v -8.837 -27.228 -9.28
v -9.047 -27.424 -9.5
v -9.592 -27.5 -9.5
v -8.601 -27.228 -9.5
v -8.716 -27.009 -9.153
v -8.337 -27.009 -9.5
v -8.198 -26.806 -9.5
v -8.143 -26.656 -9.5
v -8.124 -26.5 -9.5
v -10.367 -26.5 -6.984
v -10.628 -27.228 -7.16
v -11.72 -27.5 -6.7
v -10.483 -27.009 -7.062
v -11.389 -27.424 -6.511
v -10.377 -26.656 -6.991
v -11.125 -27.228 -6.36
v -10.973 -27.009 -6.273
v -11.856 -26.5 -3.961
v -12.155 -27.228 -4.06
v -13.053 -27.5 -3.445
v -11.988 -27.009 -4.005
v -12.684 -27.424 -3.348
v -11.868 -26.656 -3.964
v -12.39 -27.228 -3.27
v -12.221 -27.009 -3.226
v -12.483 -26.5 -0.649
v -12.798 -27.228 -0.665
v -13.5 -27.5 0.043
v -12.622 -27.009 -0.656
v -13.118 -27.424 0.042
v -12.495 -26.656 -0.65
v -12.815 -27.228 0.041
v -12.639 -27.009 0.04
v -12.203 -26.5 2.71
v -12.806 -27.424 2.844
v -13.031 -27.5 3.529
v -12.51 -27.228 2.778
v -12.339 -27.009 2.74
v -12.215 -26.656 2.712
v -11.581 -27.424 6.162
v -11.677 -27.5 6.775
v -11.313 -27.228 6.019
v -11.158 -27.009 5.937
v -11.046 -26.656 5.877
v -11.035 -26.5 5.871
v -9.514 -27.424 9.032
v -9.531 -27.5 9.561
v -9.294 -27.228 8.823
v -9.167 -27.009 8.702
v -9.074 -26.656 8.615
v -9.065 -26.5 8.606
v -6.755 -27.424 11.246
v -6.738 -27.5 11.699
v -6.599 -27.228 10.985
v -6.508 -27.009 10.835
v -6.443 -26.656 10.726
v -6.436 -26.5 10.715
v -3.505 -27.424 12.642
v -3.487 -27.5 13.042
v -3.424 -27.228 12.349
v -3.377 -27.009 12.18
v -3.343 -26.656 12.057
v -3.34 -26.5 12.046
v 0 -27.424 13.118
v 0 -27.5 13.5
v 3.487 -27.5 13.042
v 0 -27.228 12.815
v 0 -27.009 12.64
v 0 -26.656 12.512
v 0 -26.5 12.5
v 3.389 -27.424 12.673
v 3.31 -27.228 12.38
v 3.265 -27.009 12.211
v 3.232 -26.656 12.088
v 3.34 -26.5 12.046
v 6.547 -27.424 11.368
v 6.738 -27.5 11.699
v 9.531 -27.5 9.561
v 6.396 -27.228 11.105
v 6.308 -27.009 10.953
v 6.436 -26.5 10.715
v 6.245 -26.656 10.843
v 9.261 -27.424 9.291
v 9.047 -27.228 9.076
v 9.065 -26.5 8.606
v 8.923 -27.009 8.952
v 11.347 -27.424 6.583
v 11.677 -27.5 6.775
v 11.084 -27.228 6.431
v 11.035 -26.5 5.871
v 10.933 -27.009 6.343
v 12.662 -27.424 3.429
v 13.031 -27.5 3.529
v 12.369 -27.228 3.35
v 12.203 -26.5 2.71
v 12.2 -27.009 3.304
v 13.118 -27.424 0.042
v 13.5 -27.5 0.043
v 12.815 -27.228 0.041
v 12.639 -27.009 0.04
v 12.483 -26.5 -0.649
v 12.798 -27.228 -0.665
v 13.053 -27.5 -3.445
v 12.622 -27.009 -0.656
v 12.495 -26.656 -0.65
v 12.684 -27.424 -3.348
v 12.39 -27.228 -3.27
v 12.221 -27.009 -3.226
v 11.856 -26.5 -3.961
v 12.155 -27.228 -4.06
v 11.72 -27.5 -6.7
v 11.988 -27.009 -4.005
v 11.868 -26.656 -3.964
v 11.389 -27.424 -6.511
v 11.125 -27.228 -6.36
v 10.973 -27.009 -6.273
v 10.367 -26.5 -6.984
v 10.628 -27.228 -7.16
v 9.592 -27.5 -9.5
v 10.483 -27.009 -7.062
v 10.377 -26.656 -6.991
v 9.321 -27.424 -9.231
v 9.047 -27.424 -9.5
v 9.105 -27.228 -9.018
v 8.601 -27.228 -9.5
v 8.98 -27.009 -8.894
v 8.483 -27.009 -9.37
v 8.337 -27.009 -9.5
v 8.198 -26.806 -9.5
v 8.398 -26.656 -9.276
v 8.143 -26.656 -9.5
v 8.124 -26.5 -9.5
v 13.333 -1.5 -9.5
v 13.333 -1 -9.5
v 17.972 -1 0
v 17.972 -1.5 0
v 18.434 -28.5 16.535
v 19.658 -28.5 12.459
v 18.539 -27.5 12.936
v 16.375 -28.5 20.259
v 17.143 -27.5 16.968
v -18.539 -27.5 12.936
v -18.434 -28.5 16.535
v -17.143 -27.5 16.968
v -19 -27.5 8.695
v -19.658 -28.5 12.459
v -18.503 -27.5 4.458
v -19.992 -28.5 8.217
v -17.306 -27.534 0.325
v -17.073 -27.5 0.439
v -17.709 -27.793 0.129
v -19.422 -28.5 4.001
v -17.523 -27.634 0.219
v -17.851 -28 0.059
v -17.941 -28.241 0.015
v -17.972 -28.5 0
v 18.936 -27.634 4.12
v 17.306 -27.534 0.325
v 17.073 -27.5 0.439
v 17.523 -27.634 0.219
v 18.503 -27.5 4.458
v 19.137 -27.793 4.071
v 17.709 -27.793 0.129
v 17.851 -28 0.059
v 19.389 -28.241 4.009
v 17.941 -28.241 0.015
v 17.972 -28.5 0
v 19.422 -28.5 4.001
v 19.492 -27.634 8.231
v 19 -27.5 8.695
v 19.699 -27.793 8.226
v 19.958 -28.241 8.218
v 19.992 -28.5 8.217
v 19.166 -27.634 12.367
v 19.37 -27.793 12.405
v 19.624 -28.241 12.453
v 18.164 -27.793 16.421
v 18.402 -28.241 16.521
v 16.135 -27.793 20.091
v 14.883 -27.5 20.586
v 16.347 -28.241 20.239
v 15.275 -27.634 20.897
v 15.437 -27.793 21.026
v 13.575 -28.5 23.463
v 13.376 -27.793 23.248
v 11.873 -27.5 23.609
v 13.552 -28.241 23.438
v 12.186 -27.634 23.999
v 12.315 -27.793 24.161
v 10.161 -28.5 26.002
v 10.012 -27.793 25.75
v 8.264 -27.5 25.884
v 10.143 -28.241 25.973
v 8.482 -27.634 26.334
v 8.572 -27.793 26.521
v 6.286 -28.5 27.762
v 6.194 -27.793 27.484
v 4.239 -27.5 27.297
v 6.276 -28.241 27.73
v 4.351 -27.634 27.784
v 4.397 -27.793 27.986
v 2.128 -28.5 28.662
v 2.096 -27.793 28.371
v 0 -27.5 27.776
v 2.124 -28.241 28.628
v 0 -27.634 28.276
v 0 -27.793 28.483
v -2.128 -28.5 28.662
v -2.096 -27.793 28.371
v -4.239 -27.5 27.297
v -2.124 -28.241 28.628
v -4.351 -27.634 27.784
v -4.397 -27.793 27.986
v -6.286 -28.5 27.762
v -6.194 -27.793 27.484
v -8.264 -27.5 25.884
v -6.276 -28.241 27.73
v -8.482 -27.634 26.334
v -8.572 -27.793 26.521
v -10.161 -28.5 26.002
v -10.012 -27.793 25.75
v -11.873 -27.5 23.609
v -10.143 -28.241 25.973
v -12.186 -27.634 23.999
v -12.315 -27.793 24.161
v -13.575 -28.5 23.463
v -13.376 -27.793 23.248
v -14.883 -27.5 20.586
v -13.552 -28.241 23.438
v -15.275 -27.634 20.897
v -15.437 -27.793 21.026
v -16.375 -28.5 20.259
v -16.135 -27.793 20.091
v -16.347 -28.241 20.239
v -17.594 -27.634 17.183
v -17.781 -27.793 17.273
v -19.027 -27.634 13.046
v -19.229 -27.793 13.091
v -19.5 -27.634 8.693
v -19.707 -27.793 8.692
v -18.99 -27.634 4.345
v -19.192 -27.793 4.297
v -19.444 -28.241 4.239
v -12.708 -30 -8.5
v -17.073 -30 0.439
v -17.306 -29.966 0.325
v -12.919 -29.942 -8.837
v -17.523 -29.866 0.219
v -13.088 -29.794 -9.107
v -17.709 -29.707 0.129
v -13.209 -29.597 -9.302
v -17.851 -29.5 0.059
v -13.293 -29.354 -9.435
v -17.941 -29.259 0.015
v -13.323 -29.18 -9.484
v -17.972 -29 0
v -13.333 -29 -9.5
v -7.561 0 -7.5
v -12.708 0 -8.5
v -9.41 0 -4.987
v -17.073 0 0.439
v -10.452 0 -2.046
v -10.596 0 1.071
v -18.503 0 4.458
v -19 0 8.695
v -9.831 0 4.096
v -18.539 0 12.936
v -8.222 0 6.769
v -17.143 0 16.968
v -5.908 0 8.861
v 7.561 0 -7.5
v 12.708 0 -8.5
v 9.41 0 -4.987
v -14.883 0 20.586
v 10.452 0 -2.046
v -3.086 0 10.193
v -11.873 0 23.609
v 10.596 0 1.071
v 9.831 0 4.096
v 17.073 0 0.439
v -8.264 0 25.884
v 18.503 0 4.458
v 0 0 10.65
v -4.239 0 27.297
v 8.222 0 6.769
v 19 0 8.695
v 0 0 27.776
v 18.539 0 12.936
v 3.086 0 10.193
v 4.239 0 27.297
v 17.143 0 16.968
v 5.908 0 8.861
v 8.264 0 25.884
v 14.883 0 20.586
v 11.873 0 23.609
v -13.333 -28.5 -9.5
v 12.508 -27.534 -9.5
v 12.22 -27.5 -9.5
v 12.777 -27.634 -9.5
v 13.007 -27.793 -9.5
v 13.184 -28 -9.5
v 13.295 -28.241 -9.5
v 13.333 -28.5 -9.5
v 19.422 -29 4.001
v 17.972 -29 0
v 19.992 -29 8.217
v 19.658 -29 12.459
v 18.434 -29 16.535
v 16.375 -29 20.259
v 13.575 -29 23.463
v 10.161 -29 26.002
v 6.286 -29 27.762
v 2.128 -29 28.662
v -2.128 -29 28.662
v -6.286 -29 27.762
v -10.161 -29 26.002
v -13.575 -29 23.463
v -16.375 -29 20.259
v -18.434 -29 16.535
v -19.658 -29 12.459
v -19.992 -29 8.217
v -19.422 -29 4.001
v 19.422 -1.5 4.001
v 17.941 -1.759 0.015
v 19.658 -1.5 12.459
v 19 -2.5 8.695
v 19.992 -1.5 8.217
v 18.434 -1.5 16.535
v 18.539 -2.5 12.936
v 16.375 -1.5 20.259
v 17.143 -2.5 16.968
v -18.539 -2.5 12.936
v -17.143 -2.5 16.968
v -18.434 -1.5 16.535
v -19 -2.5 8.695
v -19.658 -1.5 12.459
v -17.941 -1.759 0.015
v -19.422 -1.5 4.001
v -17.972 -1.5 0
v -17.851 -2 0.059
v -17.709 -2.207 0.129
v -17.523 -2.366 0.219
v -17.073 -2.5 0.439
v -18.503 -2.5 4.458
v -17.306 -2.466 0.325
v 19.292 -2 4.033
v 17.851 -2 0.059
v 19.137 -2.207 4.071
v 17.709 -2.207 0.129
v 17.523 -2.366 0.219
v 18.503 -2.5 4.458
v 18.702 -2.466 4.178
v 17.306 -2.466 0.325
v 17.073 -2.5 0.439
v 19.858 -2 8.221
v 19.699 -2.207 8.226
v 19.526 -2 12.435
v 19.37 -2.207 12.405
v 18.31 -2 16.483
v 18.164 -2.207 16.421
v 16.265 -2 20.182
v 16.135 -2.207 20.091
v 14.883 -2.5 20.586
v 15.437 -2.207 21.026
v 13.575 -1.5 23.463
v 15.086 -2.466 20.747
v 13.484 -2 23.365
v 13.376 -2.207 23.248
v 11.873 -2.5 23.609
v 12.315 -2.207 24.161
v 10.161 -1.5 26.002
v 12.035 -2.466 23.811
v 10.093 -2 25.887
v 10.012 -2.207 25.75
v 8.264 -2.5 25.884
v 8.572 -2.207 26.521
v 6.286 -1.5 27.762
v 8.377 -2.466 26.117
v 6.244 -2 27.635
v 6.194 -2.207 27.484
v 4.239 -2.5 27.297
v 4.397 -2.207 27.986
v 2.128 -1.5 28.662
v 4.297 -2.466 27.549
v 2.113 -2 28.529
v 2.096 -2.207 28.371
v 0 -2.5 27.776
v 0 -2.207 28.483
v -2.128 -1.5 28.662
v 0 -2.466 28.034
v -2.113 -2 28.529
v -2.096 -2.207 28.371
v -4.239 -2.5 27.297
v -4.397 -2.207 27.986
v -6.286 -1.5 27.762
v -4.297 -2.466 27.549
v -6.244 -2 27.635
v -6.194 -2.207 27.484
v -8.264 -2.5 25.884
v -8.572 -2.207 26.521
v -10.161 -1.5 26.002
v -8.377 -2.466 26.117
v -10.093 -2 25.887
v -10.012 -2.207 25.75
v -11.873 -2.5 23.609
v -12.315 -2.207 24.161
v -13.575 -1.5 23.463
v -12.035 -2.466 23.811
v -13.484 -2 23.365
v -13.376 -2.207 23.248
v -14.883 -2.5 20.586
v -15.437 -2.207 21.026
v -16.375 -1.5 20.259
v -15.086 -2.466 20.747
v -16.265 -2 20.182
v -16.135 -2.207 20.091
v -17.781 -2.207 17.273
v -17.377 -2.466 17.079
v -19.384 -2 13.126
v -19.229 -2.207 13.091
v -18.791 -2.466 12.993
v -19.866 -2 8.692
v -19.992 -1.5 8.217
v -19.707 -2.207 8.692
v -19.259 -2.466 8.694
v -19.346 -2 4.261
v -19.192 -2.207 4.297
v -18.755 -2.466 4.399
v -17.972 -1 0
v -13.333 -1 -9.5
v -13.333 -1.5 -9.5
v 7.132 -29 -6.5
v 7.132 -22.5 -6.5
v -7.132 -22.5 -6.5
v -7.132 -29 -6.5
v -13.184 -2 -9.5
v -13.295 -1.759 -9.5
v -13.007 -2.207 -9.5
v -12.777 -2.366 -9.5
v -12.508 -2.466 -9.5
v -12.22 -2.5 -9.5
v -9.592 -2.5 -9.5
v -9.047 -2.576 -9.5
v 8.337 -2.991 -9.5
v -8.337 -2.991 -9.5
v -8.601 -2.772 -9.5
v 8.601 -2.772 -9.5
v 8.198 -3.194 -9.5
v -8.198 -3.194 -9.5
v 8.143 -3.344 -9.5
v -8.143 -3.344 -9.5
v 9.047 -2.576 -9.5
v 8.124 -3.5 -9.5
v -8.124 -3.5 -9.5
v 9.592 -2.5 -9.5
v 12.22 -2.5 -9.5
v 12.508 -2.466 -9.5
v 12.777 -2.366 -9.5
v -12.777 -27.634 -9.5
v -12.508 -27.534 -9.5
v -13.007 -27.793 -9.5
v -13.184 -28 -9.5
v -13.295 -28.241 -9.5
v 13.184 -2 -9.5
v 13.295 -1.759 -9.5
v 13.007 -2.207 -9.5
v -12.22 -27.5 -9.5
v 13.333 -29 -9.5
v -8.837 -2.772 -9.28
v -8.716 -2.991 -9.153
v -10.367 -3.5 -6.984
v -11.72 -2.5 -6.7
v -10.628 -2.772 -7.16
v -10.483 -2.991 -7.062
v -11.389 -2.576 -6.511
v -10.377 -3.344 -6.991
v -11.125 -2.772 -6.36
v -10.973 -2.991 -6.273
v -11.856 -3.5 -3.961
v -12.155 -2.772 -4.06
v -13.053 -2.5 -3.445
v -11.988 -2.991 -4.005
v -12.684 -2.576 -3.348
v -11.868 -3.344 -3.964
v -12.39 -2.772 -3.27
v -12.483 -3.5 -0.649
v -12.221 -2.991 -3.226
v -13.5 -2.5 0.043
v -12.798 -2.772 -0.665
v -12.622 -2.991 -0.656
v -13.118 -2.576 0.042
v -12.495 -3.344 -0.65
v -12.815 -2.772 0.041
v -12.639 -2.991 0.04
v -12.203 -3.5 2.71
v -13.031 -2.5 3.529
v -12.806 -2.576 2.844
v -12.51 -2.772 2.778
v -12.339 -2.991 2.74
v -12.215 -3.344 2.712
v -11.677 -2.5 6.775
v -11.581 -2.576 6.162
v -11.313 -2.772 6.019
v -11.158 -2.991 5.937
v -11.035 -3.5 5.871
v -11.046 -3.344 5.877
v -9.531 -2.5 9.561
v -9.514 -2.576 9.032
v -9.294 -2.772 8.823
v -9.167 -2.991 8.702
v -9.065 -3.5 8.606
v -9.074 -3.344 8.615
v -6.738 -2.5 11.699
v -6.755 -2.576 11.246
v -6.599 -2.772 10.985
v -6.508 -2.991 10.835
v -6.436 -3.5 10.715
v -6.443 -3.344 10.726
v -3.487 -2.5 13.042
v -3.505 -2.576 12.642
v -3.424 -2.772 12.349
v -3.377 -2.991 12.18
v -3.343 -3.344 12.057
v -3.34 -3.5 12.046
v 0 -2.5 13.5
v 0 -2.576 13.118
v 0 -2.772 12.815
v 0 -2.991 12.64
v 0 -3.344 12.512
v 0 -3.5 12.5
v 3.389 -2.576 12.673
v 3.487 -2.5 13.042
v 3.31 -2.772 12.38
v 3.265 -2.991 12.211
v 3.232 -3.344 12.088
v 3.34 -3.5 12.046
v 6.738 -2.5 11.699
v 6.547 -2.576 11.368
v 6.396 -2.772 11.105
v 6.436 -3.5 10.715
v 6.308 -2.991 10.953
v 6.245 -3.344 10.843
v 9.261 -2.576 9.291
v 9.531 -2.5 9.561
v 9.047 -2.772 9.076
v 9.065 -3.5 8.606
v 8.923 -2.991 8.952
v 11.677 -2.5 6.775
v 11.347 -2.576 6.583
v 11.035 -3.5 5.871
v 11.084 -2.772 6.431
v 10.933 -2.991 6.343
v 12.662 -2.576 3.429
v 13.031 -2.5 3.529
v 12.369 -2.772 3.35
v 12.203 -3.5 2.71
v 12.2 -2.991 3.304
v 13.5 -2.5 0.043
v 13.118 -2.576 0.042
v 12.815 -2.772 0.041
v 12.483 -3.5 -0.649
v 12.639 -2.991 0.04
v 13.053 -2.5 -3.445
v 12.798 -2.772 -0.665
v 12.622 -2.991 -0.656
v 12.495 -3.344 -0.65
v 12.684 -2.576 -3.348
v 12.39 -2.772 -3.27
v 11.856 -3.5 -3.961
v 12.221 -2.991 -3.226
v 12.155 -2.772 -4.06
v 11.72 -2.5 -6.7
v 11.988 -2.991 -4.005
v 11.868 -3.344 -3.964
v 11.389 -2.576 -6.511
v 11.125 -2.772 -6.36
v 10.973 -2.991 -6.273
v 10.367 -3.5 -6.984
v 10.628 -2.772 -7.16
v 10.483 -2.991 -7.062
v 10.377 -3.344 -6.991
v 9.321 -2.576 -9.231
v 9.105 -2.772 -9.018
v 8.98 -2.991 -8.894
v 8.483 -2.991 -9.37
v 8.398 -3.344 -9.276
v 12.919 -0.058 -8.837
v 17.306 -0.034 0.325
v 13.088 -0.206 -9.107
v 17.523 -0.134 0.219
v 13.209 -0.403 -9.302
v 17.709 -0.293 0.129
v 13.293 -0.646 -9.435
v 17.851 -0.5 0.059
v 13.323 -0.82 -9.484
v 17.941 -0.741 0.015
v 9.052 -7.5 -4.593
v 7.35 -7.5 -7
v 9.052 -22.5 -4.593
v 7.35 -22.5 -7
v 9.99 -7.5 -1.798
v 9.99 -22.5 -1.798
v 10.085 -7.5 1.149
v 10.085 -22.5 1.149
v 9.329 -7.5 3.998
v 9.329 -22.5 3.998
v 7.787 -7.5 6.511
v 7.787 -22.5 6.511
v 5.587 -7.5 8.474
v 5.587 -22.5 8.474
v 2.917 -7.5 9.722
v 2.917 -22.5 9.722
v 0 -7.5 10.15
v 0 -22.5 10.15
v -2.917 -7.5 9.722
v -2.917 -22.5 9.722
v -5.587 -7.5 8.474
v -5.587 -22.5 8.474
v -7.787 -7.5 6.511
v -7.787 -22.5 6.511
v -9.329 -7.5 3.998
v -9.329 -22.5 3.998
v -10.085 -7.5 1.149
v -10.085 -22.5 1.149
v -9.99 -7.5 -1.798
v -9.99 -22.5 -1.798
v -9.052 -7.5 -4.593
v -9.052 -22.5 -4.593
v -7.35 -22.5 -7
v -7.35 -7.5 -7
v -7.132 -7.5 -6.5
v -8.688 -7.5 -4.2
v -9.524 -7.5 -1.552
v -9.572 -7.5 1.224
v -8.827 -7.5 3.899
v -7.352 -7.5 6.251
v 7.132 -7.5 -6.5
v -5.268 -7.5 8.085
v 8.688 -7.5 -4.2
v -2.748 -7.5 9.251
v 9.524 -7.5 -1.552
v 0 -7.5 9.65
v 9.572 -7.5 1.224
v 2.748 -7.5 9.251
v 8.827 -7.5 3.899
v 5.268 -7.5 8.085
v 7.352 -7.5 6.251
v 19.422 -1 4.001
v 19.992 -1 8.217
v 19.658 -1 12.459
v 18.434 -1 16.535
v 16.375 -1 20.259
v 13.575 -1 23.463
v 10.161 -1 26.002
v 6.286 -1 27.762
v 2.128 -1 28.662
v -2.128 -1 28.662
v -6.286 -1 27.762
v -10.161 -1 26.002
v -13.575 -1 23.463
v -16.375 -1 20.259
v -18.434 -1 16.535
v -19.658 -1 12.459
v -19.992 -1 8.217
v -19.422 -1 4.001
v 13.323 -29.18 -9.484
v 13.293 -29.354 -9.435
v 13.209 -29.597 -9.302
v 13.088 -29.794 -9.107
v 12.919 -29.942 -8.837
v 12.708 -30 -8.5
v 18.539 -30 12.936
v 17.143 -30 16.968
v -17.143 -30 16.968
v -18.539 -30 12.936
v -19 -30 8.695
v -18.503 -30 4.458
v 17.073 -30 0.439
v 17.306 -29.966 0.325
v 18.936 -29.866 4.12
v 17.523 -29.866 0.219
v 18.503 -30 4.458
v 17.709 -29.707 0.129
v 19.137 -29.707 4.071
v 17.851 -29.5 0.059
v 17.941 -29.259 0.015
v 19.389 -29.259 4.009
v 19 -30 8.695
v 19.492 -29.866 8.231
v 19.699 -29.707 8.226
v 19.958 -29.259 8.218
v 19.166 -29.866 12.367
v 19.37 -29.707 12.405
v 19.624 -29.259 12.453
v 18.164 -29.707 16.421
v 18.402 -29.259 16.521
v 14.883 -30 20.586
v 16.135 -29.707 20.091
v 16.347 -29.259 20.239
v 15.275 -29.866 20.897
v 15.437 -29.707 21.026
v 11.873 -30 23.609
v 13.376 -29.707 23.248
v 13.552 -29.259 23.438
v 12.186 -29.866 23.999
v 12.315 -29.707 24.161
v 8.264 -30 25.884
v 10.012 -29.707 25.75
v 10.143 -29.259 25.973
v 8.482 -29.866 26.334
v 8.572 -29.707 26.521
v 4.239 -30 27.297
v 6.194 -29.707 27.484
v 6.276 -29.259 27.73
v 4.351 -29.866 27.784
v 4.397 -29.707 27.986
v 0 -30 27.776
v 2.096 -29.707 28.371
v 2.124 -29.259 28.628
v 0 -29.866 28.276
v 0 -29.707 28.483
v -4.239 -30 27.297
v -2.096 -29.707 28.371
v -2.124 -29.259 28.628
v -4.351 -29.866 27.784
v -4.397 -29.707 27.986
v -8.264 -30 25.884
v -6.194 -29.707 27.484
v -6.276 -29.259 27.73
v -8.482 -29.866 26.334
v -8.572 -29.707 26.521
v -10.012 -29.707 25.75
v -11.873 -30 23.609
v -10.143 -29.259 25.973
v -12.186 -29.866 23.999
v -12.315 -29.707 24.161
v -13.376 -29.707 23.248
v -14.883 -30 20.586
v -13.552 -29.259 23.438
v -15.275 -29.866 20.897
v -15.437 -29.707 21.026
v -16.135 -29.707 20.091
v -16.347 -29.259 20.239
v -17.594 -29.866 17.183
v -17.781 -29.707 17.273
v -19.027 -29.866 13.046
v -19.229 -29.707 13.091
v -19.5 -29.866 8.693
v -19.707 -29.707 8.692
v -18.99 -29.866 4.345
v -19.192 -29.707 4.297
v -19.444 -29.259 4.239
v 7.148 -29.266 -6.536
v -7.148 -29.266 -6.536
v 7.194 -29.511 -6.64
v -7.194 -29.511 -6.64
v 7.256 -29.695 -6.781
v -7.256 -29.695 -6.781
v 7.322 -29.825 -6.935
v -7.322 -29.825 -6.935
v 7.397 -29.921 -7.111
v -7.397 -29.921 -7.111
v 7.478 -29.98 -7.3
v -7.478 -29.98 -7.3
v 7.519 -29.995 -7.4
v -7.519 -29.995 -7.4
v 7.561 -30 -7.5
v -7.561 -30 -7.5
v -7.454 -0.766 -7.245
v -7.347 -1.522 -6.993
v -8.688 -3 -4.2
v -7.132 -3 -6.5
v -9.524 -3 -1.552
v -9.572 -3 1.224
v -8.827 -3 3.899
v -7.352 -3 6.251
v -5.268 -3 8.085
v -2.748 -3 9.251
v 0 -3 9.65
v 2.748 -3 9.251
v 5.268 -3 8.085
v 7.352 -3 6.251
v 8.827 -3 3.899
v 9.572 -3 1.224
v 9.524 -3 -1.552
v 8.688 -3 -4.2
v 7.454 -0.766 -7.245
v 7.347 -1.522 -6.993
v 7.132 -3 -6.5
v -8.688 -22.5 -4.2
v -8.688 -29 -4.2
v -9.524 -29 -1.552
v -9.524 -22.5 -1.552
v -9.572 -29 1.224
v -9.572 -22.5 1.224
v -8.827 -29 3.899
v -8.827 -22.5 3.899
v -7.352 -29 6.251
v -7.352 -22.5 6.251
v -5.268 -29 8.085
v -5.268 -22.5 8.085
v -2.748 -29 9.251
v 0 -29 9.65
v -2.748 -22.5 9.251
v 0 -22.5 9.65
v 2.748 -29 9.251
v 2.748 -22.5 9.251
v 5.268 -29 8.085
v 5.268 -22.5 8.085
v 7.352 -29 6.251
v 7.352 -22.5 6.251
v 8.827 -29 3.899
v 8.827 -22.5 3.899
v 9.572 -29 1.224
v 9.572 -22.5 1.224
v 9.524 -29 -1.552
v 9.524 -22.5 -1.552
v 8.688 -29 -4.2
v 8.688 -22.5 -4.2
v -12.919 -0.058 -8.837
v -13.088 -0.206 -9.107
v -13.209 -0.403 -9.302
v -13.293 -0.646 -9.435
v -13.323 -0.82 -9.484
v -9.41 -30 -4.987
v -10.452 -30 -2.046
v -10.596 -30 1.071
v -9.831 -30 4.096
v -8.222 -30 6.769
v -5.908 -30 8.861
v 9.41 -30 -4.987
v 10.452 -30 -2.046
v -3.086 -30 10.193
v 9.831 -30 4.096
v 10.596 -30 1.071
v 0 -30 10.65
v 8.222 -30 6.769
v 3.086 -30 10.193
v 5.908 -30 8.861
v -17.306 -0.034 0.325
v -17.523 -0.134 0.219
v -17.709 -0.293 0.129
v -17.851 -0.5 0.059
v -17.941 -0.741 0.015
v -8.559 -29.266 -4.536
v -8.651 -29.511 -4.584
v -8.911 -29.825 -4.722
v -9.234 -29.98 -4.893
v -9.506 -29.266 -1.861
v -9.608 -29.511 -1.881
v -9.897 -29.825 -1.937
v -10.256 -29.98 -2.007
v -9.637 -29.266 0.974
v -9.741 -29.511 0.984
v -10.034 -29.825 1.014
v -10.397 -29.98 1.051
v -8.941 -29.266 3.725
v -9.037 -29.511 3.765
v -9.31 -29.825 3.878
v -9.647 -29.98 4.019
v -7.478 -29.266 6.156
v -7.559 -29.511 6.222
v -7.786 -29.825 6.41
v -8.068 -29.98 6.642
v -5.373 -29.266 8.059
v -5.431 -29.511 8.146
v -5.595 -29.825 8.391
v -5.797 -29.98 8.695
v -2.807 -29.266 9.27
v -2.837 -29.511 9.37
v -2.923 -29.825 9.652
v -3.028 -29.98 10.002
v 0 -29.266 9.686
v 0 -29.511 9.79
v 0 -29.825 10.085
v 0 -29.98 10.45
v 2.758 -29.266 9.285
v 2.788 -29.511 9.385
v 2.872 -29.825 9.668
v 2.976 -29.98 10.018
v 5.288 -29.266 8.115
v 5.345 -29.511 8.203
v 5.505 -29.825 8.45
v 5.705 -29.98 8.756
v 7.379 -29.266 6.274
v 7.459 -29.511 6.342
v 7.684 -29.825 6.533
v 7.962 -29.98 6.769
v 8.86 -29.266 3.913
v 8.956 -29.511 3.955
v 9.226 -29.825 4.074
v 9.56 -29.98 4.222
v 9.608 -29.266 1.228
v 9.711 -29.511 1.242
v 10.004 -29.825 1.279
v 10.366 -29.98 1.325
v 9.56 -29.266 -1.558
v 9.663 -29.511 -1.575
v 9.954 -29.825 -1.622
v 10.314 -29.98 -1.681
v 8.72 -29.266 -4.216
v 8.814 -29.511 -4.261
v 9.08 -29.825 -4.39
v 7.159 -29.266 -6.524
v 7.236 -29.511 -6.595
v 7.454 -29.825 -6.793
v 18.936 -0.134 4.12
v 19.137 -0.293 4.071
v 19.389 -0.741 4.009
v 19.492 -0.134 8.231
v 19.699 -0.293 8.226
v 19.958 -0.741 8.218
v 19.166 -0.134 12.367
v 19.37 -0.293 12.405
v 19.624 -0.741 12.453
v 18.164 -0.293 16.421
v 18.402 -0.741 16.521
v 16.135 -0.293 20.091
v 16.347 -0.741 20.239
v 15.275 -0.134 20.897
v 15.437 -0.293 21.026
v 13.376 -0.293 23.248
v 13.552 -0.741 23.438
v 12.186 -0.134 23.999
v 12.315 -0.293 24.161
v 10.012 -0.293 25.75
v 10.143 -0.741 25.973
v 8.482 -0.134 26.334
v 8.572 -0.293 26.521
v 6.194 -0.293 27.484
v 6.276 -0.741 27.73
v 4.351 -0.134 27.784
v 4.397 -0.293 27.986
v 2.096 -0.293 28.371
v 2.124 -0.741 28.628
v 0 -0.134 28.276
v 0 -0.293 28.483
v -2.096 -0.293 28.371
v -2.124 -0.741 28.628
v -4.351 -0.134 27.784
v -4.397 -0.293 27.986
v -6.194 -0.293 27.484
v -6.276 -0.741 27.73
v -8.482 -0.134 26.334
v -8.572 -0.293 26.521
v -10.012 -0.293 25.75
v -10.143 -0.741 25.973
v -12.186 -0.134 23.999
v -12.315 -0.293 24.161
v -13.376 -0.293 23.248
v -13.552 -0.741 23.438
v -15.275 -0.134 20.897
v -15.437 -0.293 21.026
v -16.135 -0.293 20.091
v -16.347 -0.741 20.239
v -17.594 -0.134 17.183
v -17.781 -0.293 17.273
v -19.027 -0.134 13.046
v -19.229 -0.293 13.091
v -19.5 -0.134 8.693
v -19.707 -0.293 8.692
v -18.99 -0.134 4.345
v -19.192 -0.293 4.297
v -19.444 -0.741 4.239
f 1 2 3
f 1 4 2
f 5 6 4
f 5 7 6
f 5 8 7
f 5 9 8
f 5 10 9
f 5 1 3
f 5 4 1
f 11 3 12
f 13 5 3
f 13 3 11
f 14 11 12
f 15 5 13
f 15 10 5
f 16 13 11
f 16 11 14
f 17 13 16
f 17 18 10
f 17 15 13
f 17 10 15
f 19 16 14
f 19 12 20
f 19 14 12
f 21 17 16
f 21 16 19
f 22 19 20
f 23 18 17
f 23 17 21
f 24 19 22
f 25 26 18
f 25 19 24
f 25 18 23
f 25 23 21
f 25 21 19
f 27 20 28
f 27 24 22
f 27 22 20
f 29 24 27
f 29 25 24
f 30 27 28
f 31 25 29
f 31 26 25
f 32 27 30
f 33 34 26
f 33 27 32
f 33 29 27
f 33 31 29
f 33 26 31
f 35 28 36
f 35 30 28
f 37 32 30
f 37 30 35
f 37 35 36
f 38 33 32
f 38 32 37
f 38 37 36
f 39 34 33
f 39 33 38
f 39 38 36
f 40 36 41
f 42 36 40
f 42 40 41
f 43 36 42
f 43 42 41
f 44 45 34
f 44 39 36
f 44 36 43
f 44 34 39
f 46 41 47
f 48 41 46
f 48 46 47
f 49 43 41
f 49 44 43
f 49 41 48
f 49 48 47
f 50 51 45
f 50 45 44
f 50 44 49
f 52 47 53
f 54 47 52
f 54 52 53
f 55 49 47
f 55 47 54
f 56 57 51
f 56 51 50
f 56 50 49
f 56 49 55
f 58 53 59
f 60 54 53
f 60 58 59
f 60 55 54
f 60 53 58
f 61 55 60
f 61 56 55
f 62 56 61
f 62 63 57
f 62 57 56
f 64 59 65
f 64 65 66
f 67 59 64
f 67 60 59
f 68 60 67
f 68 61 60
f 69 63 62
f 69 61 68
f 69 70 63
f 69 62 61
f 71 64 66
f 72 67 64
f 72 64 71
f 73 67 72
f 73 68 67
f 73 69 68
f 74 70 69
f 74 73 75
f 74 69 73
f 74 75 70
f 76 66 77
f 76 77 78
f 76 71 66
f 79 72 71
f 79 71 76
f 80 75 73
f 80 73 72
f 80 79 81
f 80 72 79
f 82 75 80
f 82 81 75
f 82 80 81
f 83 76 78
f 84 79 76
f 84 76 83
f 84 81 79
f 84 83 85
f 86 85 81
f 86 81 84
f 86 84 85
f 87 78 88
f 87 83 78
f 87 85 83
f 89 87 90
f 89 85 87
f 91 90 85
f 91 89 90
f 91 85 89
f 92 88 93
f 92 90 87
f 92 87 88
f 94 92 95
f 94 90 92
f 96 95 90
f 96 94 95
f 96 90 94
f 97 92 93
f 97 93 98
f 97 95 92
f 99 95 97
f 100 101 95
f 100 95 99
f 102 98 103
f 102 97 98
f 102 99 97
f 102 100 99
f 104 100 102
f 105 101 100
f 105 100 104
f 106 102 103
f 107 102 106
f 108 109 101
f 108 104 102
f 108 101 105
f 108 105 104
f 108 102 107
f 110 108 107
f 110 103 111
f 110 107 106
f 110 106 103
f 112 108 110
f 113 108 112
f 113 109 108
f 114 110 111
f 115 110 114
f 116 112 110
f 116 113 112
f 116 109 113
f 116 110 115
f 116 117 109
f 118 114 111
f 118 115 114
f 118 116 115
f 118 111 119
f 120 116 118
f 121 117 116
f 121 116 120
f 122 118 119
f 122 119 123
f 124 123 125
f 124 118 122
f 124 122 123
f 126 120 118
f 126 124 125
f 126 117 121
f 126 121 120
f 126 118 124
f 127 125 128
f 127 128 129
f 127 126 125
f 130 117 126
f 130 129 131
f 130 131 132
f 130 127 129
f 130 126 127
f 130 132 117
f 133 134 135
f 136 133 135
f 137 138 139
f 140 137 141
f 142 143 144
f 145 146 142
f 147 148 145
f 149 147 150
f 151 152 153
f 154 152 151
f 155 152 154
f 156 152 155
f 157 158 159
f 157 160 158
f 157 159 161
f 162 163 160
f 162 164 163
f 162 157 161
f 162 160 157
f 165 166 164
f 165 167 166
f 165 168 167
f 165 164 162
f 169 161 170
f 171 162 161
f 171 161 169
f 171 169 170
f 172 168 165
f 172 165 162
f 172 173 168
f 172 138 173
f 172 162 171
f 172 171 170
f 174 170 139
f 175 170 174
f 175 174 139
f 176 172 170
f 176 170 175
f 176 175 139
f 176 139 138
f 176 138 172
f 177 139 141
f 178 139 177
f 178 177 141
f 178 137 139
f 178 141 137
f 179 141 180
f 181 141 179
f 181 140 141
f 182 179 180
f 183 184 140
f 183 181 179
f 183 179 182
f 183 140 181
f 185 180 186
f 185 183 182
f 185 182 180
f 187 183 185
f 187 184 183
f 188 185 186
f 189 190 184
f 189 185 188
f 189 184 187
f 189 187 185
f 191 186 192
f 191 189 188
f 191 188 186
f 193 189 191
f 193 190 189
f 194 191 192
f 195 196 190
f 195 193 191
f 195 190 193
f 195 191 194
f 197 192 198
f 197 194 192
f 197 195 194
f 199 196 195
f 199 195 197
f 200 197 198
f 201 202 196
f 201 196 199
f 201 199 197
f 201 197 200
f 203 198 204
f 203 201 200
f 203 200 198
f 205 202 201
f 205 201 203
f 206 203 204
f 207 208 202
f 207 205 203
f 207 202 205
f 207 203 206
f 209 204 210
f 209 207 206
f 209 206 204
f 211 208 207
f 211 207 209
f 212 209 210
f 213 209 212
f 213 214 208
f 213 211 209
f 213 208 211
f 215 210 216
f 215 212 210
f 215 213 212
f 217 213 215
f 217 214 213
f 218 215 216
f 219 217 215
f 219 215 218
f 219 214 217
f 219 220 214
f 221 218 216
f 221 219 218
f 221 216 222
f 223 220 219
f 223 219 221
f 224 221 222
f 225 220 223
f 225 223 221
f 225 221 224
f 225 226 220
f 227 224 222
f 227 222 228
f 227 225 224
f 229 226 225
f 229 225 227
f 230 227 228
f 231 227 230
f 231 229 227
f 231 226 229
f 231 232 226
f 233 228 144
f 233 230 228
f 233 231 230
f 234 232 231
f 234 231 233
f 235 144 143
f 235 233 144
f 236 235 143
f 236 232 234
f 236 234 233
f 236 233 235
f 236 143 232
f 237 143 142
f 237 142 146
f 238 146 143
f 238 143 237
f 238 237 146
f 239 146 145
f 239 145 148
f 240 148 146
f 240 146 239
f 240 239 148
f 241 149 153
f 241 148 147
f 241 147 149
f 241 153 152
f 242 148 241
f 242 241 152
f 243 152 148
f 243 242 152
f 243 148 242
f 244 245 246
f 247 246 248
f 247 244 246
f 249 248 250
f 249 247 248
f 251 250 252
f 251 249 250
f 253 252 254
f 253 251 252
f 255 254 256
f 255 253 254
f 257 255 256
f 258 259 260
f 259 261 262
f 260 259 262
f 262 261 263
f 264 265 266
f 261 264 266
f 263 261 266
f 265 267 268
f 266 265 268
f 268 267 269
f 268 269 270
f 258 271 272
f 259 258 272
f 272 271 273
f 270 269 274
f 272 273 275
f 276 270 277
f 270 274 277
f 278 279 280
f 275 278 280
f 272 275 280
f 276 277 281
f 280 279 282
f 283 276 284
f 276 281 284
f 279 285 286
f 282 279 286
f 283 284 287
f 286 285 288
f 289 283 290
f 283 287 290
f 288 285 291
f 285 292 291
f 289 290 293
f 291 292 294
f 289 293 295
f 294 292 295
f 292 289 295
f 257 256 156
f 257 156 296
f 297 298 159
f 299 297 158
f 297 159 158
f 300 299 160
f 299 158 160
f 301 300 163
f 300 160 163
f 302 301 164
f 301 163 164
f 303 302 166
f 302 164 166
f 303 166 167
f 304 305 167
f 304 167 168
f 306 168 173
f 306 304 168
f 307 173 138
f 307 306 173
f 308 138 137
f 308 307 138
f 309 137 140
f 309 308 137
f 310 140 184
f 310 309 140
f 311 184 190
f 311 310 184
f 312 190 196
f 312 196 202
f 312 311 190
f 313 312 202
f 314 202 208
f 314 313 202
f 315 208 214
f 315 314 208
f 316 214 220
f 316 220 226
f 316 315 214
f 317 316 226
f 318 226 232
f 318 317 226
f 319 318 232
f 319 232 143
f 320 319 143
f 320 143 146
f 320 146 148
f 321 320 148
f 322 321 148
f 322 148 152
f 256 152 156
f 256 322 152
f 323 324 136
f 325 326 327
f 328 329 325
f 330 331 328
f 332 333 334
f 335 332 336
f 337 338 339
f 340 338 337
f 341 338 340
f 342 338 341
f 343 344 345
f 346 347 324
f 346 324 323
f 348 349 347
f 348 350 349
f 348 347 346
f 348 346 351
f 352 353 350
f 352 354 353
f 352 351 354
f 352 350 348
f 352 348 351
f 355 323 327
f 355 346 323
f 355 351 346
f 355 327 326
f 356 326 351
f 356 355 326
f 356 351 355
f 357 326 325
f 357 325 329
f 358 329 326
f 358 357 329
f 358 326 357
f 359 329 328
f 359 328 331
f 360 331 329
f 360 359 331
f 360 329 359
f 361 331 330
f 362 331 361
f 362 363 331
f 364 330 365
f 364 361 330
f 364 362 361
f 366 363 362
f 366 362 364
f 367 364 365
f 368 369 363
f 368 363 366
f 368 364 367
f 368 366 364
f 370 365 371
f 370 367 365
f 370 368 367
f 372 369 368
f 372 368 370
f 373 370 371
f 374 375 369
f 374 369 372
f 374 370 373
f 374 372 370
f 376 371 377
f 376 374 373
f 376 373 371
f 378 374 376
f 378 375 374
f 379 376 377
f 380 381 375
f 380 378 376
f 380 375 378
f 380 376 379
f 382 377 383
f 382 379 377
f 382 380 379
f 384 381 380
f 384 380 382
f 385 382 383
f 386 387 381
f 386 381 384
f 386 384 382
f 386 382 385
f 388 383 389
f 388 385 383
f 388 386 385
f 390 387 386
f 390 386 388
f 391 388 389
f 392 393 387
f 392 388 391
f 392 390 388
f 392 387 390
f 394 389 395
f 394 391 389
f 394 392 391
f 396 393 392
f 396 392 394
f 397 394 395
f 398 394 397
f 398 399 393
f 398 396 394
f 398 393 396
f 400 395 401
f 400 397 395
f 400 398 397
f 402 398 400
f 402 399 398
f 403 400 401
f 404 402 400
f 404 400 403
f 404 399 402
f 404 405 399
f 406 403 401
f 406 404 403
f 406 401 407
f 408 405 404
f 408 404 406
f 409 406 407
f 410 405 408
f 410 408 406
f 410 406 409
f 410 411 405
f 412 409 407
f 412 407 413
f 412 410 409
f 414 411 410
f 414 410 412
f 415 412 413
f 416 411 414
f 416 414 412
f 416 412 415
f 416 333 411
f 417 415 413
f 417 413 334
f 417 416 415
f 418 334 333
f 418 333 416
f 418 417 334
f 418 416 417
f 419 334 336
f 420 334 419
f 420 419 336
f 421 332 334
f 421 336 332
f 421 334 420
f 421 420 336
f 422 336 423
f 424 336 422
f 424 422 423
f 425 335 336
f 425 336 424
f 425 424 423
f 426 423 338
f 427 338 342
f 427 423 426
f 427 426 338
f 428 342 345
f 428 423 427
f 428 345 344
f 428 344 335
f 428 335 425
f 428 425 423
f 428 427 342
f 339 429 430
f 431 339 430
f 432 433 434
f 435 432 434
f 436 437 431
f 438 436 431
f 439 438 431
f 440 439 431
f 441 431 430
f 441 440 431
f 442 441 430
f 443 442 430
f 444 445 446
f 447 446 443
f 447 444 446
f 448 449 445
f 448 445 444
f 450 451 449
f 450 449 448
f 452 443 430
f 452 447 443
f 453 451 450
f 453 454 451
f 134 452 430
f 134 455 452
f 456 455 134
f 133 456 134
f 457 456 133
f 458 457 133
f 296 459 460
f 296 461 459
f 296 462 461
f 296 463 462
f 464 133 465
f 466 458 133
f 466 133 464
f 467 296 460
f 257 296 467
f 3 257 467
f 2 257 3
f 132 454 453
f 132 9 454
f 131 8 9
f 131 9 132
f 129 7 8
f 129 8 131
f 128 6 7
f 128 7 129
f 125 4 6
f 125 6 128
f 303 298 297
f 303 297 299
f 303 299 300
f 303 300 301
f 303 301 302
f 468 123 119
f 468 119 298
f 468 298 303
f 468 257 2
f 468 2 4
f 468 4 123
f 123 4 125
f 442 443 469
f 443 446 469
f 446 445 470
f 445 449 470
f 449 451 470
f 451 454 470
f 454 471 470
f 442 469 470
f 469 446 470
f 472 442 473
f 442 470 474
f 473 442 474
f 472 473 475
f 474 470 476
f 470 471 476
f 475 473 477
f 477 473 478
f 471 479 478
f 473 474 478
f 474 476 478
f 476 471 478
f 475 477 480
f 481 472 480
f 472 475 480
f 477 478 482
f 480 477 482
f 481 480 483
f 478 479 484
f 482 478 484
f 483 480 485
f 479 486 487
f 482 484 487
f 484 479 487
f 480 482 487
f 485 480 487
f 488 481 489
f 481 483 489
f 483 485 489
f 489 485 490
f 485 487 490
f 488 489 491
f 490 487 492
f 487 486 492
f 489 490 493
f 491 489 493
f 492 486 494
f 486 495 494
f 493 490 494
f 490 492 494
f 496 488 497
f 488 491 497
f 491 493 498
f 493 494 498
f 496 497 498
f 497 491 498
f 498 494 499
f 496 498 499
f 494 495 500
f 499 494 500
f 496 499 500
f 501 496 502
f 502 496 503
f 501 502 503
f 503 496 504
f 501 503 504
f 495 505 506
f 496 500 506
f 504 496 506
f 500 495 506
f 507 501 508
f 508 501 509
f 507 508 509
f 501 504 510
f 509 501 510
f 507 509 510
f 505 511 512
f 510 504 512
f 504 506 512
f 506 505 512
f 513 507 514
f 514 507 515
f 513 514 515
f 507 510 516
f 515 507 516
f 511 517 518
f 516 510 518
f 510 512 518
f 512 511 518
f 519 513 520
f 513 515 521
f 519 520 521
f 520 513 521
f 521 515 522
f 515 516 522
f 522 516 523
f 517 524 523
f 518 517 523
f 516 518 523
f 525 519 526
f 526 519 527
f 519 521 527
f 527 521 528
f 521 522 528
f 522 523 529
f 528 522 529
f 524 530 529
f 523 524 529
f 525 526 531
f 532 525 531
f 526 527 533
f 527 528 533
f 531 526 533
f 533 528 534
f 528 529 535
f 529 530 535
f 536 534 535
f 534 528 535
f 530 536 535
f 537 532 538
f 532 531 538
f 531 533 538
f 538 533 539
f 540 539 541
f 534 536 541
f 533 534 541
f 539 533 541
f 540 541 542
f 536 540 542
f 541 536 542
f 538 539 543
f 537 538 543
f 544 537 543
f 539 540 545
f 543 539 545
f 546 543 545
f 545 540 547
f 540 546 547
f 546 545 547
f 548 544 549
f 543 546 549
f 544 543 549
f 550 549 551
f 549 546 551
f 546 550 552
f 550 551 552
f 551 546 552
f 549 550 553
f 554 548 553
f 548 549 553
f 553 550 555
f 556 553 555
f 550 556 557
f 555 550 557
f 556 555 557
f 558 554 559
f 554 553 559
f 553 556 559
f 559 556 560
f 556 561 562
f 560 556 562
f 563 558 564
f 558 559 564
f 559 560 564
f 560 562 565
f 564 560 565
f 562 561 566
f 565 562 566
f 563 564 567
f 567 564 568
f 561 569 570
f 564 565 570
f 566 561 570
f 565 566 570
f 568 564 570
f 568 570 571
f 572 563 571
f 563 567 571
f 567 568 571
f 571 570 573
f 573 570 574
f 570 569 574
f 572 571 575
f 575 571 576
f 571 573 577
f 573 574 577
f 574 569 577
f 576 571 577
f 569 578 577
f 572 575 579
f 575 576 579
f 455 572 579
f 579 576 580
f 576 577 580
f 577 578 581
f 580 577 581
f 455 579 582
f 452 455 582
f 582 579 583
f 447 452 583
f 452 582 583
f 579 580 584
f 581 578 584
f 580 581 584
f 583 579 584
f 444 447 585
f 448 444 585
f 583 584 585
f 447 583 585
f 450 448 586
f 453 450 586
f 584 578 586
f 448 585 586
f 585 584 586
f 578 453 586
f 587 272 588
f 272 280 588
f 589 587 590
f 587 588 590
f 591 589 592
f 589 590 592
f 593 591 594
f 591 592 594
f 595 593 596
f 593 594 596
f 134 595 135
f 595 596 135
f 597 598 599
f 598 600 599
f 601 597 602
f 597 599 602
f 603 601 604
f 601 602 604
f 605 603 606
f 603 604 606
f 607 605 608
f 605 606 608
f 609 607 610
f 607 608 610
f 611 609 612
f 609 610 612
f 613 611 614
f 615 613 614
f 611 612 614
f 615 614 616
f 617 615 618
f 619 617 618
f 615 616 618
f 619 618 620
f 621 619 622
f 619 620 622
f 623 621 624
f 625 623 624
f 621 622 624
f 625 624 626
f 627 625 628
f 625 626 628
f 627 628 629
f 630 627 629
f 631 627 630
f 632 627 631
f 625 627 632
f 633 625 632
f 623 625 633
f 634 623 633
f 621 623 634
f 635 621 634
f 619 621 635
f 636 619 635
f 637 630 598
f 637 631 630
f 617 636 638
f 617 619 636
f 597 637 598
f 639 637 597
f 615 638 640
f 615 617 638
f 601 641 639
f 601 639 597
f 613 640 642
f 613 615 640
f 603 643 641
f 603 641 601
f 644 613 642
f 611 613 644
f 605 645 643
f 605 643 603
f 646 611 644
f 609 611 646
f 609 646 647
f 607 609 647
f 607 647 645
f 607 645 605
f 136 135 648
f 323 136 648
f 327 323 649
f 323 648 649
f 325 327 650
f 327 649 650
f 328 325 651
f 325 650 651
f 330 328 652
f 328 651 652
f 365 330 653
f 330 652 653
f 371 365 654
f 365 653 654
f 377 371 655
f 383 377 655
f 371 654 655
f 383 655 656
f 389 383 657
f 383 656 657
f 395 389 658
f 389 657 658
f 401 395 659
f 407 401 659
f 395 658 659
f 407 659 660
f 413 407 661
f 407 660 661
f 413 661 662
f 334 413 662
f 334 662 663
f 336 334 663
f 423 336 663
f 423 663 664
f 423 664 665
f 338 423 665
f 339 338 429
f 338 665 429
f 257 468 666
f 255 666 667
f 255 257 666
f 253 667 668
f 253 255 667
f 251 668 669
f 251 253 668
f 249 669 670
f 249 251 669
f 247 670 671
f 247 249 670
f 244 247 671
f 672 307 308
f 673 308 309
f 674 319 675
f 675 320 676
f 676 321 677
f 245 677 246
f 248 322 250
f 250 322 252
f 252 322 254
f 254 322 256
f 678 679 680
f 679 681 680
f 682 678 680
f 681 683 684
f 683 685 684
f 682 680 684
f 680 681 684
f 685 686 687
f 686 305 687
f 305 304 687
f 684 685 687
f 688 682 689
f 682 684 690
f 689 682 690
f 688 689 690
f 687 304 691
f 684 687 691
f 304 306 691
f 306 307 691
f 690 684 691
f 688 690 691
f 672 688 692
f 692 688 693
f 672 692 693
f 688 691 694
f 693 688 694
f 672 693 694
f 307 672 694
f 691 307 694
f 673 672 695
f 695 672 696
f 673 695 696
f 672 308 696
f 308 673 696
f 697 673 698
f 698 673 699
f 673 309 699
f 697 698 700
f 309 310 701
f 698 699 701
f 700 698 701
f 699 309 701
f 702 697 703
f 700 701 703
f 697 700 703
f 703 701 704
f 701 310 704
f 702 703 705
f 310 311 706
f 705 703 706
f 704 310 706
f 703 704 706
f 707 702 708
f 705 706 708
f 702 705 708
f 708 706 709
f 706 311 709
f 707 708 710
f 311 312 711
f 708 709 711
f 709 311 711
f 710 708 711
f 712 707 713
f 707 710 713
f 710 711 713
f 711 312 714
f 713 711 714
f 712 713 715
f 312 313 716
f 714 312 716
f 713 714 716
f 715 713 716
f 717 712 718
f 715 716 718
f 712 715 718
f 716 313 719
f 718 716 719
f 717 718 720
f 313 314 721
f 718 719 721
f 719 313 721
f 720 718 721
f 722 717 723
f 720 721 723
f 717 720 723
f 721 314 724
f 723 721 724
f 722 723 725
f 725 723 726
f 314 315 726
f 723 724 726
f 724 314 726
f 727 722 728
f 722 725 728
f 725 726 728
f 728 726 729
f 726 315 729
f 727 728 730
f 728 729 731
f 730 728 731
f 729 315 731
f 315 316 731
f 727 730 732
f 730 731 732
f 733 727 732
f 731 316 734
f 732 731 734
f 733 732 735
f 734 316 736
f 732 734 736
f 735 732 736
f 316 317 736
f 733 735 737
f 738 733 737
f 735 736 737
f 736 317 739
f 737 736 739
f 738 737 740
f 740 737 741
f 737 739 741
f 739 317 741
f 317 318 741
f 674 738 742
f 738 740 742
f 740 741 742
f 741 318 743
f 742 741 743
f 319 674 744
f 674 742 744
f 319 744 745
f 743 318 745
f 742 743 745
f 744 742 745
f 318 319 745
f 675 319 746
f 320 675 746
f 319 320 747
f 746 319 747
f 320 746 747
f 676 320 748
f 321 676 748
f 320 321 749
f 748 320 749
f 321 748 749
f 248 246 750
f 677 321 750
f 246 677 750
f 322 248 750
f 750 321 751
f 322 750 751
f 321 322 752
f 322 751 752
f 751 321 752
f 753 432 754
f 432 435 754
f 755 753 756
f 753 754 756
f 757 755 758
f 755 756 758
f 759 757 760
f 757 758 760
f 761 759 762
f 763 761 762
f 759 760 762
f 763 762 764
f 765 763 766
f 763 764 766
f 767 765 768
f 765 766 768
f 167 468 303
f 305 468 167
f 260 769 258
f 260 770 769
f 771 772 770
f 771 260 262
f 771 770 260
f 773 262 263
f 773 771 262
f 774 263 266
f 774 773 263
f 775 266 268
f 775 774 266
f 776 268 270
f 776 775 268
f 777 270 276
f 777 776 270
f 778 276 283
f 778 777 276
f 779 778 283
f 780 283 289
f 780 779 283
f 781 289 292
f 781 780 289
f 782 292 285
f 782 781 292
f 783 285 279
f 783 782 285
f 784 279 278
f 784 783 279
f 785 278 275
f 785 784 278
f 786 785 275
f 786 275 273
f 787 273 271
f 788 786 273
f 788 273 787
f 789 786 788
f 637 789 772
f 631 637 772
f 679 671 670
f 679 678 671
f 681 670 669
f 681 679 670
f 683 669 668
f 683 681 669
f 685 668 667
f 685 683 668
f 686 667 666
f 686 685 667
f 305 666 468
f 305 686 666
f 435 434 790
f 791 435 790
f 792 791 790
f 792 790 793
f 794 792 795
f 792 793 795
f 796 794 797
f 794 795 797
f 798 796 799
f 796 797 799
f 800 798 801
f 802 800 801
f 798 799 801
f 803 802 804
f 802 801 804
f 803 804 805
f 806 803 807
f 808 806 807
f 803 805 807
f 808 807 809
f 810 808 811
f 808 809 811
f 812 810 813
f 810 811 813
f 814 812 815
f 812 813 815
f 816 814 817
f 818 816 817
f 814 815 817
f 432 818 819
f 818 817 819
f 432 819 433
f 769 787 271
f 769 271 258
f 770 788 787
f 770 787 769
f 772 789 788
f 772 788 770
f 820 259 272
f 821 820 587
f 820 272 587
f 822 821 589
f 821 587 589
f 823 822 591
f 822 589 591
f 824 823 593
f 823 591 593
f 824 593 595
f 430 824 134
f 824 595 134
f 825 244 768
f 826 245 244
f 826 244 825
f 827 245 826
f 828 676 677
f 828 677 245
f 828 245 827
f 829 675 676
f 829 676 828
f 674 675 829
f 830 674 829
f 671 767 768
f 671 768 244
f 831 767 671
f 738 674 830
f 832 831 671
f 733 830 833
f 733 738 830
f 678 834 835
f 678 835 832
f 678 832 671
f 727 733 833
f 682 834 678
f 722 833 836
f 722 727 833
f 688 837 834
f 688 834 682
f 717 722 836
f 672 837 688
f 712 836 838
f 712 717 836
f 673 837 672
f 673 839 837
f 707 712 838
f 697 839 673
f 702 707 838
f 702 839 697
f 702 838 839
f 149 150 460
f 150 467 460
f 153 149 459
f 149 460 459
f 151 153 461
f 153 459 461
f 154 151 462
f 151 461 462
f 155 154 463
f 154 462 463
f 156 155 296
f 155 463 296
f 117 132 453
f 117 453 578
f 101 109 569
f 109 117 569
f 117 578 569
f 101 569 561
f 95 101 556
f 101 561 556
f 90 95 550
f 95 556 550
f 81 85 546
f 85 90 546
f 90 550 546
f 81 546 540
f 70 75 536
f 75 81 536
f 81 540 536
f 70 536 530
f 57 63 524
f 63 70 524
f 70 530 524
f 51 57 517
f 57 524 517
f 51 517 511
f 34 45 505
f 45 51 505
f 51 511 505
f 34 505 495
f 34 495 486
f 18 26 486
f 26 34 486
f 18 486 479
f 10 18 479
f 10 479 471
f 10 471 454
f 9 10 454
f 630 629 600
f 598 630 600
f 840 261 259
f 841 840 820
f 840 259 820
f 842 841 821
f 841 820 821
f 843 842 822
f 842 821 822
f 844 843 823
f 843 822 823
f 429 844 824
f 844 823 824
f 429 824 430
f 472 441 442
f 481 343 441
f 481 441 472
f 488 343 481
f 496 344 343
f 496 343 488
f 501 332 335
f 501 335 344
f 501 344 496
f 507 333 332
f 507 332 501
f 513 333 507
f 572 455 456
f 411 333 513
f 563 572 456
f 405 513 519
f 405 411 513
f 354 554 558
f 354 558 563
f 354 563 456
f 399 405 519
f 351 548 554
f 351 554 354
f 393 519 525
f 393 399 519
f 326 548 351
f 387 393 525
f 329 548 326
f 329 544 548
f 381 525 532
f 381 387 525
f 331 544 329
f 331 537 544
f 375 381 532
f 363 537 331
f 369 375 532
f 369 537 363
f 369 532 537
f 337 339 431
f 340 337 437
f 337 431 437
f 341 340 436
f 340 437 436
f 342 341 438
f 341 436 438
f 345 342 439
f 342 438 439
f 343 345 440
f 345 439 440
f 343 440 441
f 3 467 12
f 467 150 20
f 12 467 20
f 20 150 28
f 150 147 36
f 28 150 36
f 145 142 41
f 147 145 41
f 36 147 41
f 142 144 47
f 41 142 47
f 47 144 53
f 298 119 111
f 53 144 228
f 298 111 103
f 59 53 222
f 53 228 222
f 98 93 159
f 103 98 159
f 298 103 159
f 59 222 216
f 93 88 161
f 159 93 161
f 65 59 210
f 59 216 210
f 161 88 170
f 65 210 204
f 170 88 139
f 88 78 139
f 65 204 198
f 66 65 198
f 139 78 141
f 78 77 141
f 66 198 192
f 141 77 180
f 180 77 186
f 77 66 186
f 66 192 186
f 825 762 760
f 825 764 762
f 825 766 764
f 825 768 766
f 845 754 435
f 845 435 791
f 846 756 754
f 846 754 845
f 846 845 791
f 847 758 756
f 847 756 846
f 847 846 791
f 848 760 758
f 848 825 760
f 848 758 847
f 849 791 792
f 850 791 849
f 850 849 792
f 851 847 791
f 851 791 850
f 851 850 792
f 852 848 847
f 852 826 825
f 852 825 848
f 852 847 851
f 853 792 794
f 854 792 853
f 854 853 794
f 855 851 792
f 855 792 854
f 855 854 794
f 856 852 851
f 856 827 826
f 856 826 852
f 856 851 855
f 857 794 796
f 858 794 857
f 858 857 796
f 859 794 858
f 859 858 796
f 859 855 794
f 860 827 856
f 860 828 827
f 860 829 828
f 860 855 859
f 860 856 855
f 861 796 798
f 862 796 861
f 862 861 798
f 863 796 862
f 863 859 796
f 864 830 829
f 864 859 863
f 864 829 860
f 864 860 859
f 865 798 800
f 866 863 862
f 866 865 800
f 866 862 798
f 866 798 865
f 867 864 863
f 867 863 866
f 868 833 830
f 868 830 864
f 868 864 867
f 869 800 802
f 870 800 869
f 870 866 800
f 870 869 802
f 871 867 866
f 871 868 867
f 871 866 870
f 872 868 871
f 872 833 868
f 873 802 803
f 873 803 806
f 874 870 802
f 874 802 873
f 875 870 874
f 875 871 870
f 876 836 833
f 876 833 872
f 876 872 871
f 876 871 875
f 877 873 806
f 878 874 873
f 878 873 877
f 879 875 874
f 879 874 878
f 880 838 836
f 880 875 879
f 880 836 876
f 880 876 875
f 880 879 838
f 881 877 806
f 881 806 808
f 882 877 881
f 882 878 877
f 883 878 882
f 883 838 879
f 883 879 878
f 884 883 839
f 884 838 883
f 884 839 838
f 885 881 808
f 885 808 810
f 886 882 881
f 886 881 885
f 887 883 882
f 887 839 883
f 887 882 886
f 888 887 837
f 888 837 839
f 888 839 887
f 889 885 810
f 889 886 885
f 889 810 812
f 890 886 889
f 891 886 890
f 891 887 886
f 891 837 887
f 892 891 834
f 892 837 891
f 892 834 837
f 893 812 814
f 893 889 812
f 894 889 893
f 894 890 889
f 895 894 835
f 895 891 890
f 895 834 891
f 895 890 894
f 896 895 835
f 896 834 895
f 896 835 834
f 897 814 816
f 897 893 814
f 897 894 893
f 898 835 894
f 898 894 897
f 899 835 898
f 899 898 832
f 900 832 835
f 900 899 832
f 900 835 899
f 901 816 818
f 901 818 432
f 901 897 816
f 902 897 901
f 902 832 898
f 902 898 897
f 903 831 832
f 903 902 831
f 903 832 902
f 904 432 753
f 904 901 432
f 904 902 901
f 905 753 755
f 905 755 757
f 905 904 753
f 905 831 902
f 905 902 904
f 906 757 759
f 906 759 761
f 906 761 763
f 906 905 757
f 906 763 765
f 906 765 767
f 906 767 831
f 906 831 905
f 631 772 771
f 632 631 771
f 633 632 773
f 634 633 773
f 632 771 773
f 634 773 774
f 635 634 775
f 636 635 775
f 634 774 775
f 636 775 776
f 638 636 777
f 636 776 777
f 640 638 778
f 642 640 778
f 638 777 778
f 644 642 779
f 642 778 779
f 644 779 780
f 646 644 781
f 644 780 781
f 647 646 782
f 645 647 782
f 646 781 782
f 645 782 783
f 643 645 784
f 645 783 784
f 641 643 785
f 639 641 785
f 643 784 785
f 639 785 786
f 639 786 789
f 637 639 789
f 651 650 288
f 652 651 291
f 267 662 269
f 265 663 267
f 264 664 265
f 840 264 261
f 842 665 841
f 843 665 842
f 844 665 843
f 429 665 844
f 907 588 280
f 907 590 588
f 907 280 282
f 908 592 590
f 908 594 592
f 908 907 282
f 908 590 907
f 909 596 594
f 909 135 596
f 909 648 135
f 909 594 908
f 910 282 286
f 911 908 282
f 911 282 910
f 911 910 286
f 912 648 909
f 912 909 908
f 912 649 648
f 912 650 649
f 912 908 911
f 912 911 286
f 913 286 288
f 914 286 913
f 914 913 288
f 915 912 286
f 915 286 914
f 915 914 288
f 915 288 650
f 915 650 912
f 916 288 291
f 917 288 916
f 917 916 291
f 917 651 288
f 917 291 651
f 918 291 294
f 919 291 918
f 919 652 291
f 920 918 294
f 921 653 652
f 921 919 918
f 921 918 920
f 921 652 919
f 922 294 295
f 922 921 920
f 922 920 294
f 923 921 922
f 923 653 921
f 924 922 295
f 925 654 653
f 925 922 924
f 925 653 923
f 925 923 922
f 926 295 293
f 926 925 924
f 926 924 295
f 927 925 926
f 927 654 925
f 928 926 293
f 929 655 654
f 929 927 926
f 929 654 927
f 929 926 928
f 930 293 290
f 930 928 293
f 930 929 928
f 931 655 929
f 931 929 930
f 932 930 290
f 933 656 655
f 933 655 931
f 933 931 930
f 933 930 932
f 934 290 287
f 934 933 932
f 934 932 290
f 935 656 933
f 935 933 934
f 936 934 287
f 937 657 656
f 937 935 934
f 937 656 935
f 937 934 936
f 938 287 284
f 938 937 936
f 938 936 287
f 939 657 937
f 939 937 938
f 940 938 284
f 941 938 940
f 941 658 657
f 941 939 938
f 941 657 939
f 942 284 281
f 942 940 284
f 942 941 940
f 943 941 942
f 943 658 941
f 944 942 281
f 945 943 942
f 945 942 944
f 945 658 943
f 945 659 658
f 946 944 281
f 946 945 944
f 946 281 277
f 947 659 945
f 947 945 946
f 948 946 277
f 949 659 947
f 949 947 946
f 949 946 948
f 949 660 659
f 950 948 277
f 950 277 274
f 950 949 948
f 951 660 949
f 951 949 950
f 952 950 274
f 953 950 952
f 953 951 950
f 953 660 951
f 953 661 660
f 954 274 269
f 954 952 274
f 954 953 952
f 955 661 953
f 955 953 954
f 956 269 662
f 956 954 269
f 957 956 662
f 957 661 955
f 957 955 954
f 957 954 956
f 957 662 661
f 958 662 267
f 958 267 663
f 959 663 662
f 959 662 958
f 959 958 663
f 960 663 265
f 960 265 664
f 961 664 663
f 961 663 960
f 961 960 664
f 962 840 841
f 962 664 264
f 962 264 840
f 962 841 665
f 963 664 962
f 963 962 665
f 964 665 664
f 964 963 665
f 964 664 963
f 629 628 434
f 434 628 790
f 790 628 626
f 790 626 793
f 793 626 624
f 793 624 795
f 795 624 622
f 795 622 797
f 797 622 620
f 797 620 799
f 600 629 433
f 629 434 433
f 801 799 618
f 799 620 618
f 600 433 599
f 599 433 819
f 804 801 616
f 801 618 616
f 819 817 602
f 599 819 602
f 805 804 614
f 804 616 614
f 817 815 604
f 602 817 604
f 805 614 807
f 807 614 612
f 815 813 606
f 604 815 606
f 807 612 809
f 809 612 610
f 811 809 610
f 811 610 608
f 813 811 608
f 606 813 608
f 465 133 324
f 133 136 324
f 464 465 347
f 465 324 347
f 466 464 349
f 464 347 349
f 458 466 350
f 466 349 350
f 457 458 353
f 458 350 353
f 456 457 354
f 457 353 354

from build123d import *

# Parameters (mm, degrees)
F1_DEPTH  = 30
F2_DEPTH  = 2.5
F4_DEPTH  = 2.5
F5_SIZE2  = 3
F5_SIZE   = 1
F6_R      = 1
F7_R      = 1
F10_DEPTH = 7.5


with BuildPart() as f1:
    # F0 (on Front) → F1 (new body)
    with BuildSketch(Plane.XZ):
        with BuildLine():
            Line((-8.124038, -9.5), (8.124038, -9.5))
            ThreePointArc((8.124038, -9.5), (0, 12.5), (-8.124038, -9.5))
        make_face()
        with BuildLine():
            ThreePointArc((-7.132496, -6.5), (0, 9.65), (7.132496, -6.5))
            Line((7.132496, -6.5), (-7.132496, -6.5))
        make_face(mode=Mode.SUBTRACT)
    extrude(amount=F1_DEPTH)

    # F0 (on Front) → F2 (join)
    with BuildSketch(Plane.XZ):
        with BuildLine():
            ThreePointArc((-8.124038, -9.5), (0, 12.5), (8.124038, -9.5))
            Line((8.124038, -9.5), (13.333003, -9.5))
            Line((13.333003, -9.5), (17.971858, 0))
            ThreePointArc((17.971858, 0), (0, 28.775667), (-17.971858, 0))
            Line((-17.971858, 0), (-13.333003, -9.5))
            Line((-13.333003, -9.5), (-8.124038, -9.5))
        make_face()
    extrude(amount=F2_DEPTH)

    # F3 (on face) → F4 (join)
    with BuildSketch(Plane.XZ.offset(30)):
        with BuildLine():
            Line((13.333003, -9.5), (17.971858, 0))
            ThreePointArc((17.971858, 0), (0, 28.775667), (-17.971858, 0))
            Line((-17.971858, 0), (-13.333003, -9.5))
            Line((-13.333003, -9.5), (-8.124038, -9.5))
            ThreePointArc((-8.124038, -9.5), (0, 12.5), (8.124038, -9.5))
            Line((8.124038, -9.5), (13.333003, -9.5))
        make_face()
    extrude(amount=-F4_DEPTH)

    # F5
    f5_edges = [f1.edges().sort_by_distance(p)[0] for p in [
        (0, 0, 9.65),
        (0, 0, -6.5),
    ]]
    chamfer(f5_edges, length=F5_SIZE, length2=F5_SIZE2)

    # F6
    f6_edges = [f1.edges().sort_by_distance(p)[0] for p in [
        (0, -2.5, 12.5),
        (0, -27.5, 12.5),
        (0, 0, 28.775667),
        (0, -30, 28.775667),
        (0, 0, -9.5),
        (0, -30, -9.5),
        (0, -30, 9.65),
        (0, -30, -6.5),
    ]]
    fillet(f6_edges, radius=F6_R)

    # F7
    f7_edges = [f1.edges().sort_by_distance(p)[0] for p in [
        (0, -27.5, 28.775667),
        (0, -2.5, 28.775667),
    ]]
    fillet(f7_edges, radius=F7_R)

    # F9 (on offset) → F10 (cut, symmetric)
    with BuildSketch(Plane.XZ.offset(15)):
        with BuildLine():
            ThreePointArc((7.35, -7), (0, 10.15), (-7.35, -7))
            Line((-7.35, -7), (7.35, -7))
        make_face()
        with BuildLine():
            ThreePointArc((-7.132496, -6.5), (0, 9.65), (7.132496, -6.5))
            Line((7.132496, -6.5), (-7.132496, -6.5))
        make_face(mode=Mode.SUBTRACT)
    extrude(amount=F10_DEPTH, both=True, mode=Mode.SUBTRACT)


solid = f1.part
